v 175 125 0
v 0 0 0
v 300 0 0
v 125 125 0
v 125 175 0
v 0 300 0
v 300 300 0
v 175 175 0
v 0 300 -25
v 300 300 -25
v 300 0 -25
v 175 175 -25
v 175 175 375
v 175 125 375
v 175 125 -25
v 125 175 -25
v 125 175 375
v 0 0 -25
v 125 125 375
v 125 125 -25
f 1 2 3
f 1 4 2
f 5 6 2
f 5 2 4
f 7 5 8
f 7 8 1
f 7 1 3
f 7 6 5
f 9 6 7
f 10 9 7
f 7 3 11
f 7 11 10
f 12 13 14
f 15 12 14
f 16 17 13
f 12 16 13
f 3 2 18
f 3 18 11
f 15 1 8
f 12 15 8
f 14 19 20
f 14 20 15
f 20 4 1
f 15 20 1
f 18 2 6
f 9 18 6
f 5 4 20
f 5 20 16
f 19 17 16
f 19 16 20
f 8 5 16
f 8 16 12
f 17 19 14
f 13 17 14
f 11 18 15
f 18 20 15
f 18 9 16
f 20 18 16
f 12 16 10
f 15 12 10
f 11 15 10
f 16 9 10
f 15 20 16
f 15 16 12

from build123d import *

# Parameters (mm, degrees)
F0_W     = 300
F0_H     = 300
F0_W_2   = 50
F0_H_2   = 50
F1_DEPTH = 25
F2_W     = 50
F2_H     = 50
F3_DEPTH = 400


with BuildPart() as f1:
    # F0 (on Top) → F1 (new body)
    with BuildSketch(Plane.XY):
        with Locations((150, 150)):
            Rectangle(F0_W, F0_H)
        with Locations((150, 150)):
            Rectangle(F0_W_2, F0_H_2, mode=Mode.SUBTRACT)
    extrude(amount=-F1_DEPTH)


with BuildPart() as f3:
    # F2 (on face) → F3 (new body)
    with BuildSketch(Plane(origin=(0, 0, -25), x_dir=(1, 0, 0), z_dir=(0, 0, -1))):
        with Locations((150, -150)):
            Rectangle(F2_W, F2_H)
    extrude(amount=-F3_DEPTH)


solid = Compound([f1.part, f3.part])
